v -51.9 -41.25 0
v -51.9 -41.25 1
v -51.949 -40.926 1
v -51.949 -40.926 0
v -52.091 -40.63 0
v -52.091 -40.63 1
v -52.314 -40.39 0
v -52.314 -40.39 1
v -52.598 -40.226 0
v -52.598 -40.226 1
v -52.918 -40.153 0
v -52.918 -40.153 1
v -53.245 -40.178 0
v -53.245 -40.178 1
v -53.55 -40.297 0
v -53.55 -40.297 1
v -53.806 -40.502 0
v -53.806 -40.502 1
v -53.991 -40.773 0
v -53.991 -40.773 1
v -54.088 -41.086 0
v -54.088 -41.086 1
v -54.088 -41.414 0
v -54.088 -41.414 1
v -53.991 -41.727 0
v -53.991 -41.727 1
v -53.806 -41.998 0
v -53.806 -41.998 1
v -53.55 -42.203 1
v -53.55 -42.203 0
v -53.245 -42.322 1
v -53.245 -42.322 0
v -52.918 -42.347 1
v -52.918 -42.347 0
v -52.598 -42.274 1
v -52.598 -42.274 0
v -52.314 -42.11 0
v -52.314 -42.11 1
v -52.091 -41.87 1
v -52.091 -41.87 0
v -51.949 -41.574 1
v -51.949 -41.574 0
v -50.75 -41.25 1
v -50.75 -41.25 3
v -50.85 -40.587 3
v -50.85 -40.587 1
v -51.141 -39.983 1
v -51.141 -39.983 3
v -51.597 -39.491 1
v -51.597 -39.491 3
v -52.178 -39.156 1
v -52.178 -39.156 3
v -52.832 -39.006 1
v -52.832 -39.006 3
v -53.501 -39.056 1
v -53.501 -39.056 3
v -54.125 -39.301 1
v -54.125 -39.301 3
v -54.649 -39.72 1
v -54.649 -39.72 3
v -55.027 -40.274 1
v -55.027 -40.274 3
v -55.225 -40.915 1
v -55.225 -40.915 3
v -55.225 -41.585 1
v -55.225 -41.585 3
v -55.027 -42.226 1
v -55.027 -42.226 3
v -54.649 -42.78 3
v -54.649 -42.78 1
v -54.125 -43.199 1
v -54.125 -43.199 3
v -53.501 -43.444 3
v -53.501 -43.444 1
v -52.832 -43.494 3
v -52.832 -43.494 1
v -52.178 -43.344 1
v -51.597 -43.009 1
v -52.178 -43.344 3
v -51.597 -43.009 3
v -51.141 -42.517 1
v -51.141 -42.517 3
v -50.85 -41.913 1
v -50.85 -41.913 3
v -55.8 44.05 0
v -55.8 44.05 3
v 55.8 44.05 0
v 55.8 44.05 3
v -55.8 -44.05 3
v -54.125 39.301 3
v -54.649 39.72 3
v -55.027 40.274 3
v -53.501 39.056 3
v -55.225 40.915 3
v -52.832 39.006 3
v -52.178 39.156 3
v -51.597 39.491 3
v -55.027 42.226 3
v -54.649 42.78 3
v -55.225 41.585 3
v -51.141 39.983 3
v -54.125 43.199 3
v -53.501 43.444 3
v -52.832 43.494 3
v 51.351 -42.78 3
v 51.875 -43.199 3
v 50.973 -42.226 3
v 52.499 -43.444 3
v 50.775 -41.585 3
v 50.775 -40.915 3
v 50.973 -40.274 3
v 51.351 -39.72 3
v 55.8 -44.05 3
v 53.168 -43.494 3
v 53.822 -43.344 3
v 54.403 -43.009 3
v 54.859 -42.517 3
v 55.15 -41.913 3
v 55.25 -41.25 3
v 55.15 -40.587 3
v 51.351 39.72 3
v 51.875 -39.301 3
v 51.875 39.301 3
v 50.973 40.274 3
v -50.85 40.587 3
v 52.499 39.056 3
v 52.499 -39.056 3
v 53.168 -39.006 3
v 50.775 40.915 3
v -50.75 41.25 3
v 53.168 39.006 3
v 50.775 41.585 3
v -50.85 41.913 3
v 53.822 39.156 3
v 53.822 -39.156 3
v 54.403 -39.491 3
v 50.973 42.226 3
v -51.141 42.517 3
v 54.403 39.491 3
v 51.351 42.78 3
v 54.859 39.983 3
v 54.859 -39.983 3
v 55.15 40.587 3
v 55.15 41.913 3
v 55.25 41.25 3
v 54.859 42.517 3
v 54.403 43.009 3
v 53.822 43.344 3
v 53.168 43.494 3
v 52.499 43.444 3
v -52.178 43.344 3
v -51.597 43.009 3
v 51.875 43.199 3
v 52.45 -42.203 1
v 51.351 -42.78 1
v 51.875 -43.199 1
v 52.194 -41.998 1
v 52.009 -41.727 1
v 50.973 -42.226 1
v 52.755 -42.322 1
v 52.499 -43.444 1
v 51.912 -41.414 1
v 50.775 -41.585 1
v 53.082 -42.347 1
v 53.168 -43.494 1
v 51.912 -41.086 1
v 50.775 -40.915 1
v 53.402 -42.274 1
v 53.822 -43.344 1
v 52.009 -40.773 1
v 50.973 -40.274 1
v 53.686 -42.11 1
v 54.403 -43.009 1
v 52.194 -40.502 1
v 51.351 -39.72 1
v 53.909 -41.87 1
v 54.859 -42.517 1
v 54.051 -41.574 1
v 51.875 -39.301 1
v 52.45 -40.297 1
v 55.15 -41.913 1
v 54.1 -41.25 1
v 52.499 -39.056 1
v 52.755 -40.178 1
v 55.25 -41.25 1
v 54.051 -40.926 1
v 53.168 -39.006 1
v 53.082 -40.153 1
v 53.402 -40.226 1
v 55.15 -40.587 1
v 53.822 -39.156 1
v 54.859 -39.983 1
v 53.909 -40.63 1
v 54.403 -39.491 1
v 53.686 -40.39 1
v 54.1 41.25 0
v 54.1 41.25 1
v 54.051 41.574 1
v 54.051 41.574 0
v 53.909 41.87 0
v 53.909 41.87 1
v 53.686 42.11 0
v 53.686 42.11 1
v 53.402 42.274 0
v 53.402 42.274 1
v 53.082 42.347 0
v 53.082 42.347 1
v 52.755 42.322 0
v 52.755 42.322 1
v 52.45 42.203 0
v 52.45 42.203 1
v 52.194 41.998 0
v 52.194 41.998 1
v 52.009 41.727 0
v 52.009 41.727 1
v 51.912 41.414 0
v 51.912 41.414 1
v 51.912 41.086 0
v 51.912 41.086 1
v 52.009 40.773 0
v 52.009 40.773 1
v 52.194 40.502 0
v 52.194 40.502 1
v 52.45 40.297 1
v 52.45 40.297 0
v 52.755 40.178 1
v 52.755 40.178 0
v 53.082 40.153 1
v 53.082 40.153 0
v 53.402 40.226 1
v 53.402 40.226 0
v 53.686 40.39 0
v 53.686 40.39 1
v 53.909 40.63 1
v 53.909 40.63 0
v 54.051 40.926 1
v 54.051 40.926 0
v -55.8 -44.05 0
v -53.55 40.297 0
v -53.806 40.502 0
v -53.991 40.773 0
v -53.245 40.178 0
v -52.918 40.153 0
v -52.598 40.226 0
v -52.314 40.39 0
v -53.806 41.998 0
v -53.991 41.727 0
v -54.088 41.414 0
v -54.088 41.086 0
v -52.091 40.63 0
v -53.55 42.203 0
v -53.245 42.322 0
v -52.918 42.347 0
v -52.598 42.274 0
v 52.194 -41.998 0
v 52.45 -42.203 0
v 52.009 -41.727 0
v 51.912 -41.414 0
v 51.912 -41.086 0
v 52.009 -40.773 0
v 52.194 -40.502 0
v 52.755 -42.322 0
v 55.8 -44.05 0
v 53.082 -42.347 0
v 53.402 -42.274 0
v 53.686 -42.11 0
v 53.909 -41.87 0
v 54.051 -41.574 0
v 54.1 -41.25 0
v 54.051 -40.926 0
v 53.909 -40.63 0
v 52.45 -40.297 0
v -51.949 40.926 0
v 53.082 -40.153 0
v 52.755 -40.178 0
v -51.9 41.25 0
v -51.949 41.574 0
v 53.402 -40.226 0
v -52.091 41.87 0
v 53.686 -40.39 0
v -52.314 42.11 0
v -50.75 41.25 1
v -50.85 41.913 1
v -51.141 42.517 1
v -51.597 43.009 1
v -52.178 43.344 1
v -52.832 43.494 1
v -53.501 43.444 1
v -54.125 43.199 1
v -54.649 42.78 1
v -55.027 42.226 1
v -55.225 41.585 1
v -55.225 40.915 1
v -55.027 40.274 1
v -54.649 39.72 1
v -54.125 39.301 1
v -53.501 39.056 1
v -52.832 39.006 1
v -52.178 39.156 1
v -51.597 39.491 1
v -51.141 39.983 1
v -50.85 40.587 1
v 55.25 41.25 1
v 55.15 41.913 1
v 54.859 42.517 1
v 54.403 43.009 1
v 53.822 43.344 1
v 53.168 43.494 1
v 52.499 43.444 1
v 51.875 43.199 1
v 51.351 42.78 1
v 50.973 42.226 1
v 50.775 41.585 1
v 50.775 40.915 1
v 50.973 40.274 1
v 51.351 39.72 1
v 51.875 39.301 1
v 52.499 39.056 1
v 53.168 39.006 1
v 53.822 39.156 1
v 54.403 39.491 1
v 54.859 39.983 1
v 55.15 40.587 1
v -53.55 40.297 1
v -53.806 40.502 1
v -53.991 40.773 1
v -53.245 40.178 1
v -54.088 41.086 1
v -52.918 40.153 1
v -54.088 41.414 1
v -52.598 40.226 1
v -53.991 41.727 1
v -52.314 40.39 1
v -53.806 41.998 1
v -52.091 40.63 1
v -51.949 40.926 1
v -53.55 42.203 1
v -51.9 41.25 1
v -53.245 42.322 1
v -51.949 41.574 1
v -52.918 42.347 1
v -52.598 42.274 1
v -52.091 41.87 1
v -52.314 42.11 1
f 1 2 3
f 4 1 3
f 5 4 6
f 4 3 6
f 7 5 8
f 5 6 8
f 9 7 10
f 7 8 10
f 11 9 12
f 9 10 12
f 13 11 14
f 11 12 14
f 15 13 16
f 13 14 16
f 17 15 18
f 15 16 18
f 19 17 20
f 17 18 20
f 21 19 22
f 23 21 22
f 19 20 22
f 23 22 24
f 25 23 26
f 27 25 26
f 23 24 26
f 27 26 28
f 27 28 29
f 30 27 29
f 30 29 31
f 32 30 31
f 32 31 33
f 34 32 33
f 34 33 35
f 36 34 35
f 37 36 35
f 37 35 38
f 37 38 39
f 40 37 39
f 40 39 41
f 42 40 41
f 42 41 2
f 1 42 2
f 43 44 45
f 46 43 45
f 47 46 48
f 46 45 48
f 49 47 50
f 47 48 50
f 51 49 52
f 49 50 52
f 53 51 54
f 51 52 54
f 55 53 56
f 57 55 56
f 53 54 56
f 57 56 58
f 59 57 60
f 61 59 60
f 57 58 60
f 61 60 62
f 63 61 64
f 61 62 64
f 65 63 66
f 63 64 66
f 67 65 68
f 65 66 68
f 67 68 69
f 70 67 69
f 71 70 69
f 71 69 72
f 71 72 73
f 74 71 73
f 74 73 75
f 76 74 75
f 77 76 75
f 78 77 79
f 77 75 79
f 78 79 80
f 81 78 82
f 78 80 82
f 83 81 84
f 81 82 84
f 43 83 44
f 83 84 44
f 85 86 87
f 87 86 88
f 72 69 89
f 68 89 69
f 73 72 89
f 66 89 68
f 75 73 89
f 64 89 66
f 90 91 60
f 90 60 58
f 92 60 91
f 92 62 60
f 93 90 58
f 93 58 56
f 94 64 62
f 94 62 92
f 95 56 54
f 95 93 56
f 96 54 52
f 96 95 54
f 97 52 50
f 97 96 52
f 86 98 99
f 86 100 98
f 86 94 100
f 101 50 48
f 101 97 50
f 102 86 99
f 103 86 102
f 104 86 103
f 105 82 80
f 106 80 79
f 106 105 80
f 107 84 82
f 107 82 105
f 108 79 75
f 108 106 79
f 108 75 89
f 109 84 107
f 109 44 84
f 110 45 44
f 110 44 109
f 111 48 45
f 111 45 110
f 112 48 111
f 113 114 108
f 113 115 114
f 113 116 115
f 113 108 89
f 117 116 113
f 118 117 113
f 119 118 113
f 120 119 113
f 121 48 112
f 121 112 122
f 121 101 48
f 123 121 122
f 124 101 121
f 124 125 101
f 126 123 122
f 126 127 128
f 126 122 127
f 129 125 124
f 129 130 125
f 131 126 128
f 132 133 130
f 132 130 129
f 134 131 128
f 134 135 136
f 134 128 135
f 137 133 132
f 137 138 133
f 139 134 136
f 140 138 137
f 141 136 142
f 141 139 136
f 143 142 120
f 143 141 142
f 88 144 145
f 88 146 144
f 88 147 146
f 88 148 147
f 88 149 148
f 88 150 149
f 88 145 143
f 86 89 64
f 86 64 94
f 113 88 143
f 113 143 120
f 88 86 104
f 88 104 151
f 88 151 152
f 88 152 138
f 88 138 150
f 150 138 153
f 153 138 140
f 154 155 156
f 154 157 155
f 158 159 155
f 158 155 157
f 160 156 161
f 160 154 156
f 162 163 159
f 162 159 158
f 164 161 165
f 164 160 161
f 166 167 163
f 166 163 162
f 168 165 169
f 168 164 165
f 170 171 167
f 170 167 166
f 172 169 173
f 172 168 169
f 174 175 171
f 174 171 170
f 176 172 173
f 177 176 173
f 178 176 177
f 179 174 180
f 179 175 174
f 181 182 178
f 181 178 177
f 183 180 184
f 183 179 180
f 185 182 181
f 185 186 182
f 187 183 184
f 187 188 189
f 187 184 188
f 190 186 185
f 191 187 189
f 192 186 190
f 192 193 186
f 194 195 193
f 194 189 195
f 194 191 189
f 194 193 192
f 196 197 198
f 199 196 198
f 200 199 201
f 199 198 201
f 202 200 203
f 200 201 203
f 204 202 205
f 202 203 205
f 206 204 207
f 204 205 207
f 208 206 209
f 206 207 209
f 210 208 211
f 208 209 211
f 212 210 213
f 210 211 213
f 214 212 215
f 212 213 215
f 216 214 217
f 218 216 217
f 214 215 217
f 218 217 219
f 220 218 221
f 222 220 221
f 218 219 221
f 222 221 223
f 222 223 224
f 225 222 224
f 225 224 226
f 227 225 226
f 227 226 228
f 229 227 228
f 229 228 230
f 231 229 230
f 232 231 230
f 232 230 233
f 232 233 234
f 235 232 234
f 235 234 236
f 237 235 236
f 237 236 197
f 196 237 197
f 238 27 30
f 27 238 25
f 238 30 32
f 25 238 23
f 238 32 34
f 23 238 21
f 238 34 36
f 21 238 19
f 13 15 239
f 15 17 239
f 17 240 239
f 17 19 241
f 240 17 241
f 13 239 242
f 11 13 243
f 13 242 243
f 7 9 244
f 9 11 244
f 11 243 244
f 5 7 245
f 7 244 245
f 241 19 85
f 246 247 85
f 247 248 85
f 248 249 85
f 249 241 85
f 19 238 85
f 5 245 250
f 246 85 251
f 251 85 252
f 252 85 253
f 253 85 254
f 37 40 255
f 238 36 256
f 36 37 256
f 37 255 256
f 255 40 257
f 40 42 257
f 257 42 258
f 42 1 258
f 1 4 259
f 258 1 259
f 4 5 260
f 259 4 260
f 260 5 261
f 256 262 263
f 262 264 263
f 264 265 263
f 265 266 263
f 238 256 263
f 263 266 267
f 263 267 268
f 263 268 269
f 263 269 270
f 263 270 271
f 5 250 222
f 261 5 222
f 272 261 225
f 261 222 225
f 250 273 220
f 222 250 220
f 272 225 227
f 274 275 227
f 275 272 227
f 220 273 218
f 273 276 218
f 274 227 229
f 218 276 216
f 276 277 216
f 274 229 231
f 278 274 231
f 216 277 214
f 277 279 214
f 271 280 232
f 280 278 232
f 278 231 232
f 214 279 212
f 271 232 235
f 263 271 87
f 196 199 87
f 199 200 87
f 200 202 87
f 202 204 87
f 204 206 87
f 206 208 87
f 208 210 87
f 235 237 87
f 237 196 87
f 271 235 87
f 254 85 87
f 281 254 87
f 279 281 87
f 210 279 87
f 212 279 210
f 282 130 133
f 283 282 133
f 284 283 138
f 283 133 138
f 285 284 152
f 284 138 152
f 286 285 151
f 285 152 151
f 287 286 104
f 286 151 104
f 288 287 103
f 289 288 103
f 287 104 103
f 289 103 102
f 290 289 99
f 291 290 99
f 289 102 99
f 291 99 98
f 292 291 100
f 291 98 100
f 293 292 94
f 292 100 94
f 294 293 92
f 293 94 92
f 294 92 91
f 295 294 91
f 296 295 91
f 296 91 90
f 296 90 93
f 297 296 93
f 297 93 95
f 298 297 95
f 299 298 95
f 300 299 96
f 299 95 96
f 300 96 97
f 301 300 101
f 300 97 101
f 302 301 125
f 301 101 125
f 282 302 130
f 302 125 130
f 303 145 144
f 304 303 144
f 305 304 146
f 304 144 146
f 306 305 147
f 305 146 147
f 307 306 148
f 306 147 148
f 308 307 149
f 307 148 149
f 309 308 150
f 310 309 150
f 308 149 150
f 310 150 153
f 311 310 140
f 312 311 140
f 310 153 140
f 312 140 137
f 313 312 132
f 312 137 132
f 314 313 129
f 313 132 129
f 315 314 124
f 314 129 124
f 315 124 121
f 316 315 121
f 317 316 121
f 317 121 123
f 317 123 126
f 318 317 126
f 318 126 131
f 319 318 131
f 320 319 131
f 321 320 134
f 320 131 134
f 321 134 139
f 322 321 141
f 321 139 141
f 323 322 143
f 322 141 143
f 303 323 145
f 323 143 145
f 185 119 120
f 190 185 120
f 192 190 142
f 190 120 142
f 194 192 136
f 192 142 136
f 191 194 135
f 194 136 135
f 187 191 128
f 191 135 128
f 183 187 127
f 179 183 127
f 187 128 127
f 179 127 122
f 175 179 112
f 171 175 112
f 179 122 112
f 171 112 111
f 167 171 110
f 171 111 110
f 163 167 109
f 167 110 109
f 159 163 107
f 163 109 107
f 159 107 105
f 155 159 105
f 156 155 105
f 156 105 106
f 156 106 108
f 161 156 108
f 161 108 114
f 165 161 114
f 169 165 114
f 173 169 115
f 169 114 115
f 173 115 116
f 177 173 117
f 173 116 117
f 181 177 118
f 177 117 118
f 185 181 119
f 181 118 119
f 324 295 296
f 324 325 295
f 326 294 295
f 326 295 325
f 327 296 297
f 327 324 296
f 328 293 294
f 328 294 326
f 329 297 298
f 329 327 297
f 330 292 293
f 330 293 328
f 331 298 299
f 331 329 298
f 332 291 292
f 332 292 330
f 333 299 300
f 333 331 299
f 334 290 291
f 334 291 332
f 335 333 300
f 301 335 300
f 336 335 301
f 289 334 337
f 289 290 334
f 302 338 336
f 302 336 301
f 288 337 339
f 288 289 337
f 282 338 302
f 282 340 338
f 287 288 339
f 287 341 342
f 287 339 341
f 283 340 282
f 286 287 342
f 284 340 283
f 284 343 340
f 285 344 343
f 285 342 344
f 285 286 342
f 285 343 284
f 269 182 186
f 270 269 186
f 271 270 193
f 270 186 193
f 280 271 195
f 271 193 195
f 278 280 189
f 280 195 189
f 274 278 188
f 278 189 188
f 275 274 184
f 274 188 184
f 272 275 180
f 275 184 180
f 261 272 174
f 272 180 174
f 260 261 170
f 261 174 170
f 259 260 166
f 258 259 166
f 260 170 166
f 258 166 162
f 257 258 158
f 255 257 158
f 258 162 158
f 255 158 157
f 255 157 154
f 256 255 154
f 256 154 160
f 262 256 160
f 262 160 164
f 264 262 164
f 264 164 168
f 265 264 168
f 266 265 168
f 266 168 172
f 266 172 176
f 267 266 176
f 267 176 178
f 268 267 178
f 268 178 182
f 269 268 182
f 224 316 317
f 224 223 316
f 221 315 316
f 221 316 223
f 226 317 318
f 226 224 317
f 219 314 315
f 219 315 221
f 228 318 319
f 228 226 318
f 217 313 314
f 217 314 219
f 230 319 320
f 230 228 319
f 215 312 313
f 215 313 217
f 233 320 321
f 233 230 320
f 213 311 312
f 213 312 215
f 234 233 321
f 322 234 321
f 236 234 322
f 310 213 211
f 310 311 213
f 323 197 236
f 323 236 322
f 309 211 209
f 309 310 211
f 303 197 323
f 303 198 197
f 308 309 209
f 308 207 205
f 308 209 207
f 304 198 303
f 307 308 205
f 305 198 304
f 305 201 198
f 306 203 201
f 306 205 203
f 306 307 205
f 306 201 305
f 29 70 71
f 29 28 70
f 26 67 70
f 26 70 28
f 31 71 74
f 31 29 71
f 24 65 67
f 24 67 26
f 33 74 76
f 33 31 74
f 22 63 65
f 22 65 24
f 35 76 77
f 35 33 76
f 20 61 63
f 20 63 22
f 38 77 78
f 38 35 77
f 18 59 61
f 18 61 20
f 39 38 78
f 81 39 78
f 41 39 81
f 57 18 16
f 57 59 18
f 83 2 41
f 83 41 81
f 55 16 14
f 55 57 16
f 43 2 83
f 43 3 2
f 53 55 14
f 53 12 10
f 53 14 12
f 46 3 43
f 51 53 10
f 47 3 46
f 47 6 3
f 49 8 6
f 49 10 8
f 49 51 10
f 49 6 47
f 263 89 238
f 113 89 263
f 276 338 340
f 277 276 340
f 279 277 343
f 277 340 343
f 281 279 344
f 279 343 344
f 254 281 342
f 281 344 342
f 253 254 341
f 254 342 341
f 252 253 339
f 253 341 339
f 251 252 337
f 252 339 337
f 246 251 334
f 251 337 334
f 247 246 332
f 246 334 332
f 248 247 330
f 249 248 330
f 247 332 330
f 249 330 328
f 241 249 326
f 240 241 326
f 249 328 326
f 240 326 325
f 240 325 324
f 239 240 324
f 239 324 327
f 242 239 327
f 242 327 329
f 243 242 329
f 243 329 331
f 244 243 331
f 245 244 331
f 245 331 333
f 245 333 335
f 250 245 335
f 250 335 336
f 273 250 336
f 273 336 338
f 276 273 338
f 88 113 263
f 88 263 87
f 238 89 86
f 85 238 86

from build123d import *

# Parameters (mm, degrees)
SKETCH1_W           = 112
SKETCH1_H           = 88.5
BOSS_EXTRUDE1_DEPTH = 3
SKETCH2_R           = 1.1
CUT_EXTRUDE1_DEPTH  = 72.435722856
SKETCH3_W           = 112
SKETCH3_H           = 88.5
SKETCH3_W_2         = 111.6
SKETCH3_H_2         = 88.1
CUT_EXTRUDE2_DEPTH  = 72.435722856
SKETCH4_R           = 2.25
CUT_EXTRUDE3_DEPTH  = 2


with BuildPart() as part:
    # Sketch1 → Boss-Extrude1 (new body)
    with BuildSketch(Plane.XY):
        Rectangle(SKETCH1_W, SKETCH1_H)
    extrude(amount=BOSS_EXTRUDE1_DEPTH)

    # Sketch2 → Cut-Extrude1 (cut, through all)
    with BuildSketch(Plane.XY.offset(3)):
        with Locations((-53, 41.25)):
            Circle(SKETCH2_R)
        with Locations((53, 41.25)):
            Circle(SKETCH2_R)
        with Locations((53, -41.25)):
            Circle(SKETCH2_R)
        with Locations((-53, -41.25)):
            Circle(SKETCH2_R)
    extrude(amount=-CUT_EXTRUDE1_DEPTH, mode=Mode.SUBTRACT)

    # Sketch3 → Cut-Extrude2 (cut, through all)
    with BuildSketch(Plane.XY.offset(3)):
        Rectangle(SKETCH3_W, SKETCH3_H)
        Rectangle(SKETCH3_W_2, SKETCH3_H_2, mode=Mode.SUBTRACT)
    extrude(amount=-CUT_EXTRUDE2_DEPTH, mode=Mode.SUBTRACT)

    # Sketch4 → Cut-Extrude3 (cut)
    with BuildSketch(Plane.XY.offset(3)):
        with Locations((-53, 41.25)):
            Circle(SKETCH4_R)
        with Locations((53, 41.25)):
            Circle(SKETCH4_R)
        with Locations((53, -41.25)):
            Circle(SKETCH4_R)
        with Locations((-53, -41.25)):
            Circle(SKETCH4_R)
    extrude(amount=-CUT_EXTRUDE3_DEPTH, mode=Mode.SUBTRACT)


solid = part.part
